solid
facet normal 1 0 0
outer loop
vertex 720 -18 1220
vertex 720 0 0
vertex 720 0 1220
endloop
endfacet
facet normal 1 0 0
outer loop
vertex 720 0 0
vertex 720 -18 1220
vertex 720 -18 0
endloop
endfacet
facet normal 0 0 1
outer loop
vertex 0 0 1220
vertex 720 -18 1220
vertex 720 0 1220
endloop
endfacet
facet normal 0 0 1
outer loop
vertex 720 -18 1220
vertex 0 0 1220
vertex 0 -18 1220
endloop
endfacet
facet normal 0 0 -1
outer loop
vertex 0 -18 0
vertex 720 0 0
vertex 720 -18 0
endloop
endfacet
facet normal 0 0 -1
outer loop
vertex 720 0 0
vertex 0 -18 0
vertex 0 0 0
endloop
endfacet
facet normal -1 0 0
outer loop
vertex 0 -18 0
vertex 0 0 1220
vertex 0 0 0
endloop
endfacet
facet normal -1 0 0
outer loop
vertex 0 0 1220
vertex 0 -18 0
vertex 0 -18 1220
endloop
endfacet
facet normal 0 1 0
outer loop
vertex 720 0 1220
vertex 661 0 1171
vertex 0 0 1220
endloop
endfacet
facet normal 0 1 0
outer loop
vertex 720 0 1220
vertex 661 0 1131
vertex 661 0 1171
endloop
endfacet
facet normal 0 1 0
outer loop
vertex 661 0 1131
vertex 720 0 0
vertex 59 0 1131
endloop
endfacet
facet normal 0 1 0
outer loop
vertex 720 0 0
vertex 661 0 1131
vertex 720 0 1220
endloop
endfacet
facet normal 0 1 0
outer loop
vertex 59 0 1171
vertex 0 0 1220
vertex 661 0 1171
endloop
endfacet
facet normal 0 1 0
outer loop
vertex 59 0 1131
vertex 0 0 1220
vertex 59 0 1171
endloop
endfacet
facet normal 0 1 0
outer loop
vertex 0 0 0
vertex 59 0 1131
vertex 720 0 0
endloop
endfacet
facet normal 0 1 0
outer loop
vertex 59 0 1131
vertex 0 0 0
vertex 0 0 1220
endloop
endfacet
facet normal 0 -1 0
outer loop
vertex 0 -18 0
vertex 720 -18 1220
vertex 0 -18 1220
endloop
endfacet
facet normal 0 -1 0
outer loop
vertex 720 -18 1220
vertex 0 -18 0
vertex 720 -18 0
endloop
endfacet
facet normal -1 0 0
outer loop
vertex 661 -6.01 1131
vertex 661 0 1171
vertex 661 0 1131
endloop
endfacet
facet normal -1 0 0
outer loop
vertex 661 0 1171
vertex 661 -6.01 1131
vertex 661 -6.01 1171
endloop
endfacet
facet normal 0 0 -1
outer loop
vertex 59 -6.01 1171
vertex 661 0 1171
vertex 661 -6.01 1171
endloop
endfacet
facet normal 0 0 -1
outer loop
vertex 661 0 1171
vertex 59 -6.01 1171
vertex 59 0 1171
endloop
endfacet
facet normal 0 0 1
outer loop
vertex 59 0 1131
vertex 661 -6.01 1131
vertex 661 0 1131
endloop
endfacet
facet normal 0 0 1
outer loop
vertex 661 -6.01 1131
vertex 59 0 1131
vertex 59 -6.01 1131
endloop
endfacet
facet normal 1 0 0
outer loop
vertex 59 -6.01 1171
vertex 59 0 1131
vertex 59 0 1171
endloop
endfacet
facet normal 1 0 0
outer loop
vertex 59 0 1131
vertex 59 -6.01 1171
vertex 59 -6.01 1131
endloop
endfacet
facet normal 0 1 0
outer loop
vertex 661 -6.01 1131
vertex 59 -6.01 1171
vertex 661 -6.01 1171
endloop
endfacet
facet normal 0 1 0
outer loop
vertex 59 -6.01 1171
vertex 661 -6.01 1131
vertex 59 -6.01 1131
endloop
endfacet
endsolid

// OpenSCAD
// file: ../components/backing_panel.scad
//
// Generic backing panel with optional routed recesses in the back face.
//
// Local coordinate system:
// - X: left to right
// - Y: back face at Y = 0, front projects towards negative Y
// - Z: bottom to top
//
// recesses: [x, z, width, height, depth]
//

module backing_panel(
    width,
    height,
    thickness,
    recesses = []
) {
    difference() {
        translate([0, -thickness, 0])
            cube([width, thickness, height]);

        for (r = recesses) {
            recess_x      = r[0];
            recess_z      = r[1];
            recess_width  = r[2];
            recess_height = r[3];
            recess_depth  = r[4];

            // Pocket is routed from the back face into the panel.
            translate([
                recess_x,
                -recess_depth - 0.01,
                recess_z
            ])
                cube([
                    recess_width,
                    recess_depth + 0.02,
                    recess_height
                ]);
        }
    }
}
// file: ../config.scad
//
// Garage layout - configuration
// Units: millimetres
//

$fn = 48;


/* [View] */

show_rear_wall           = true;
show_left_wall           = true;
show_window_frame        = true;
show_door_frame          = true;
show_window_sill         = true;
show_workbench           = true;
show_floor               = true;
show_tool_backing_panels = true;
show_skadis_panels       = true;
show_tool_panel_mounts   = true;
show_skadis_slot_pattern = true;
show_skadis_mount_points = true;
show_skadis_mount_hardware = false;

// Move multiplex + SKADIS towards the garage to inspect the concealed mount.
tool_panel_explode = 0; // [0:5:150]


/* [Garage walls] */

wall_width     = 3800;
wall_height    = 2600;

// Concrete / structural inner shell only.
// Additional exterior wall layers can be added later.
wall_thickness = 90;

// Temporary left-wall depth follows the currently modelled floor depth.
// This will become the measured garage depth later.
left_wall_depth = 2000;


/* [Window opening] */

// Inside view: measured from the left side of the rear wall.
window_left_offset = 480;
window_width       = 780;
window_height      = 1340;
window_top_offset  = 200;

window_bottom = wall_height - window_top_offset - window_height;


/* [Window sill] */

// Projection into the garage from the inside face of the wall.
window_sill_thickness  = 20;
window_sill_depth      = 20;
window_sill_side_extra = 20;


/* [Door opening] */

// Horizontal distance between the right side of the window opening
// and the left side of the door opening.
window_to_door = 740;

// Width is provisional until measured.
door_width  = 900;
door_height = 2300;

door_left = window_left_offset + window_width + window_to_door;


/* [Exterior frames] */

// Simplified visualization. Both frames sit on the exterior side
// of the 90 mm concrete wall.
frame_border = 50;
frame_depth  = 60;


/* [Workbench] */

workbench_width  = 1500;
workbench_depth  = 750;
workbench_height = 990;

workbench_top_thickness = 40;
workbench_leg_size      = 70;
workbench_leg_inset     = 60;

// Inside view: workbench starts at the left end of the rear wall.
workbench_x = 0;


/* [Tool panel backing] */

// Use the 1220 mm sheet dimension directly. The backing panels are centred
// vertically on the window opening instead of being made as tall as the window.
tool_panel_height = 1220;
tool_panel_bottom = window_bottom + (window_height - tool_panel_height) / 2;
tool_panel_top    = tool_panel_bottom + tool_panel_height;

tool_panel_thickness = 18;

// Left wall strip is 480 mm; keep 10 mm free on each side.
left_tool_panel_width = 460;
left_tool_panel_x = (window_left_offset - left_tool_panel_width) / 2;

// Right wall strip between window and door is 740 mm; keep 10 mm each side.
right_tool_panel_width = 720;
right_tool_panel_x =
    window_left_offset + window_width
    + (window_to_door - right_tool_panel_width) / 2;


/* [SKADIS] */

skadis_width  = 360;
skadis_height = 560;
skadis_thickness = 5;

// Approximate stand-off created by the original IKEA wall rail/spacers.
skadis_mount_gap = 15;

// Geometry used for the recognisable SKADIS pattern.
skadis_corner_radius = 9;
skadis_slot_width    = 5;
skadis_slot_height   = 15;
skadis_grid_pitch    = 40;
skadis_grid_offset   = 20;

// The 36 cm board uses the supplied 20 cm wall rail. The four visible board
// fasteners are modelled at the corresponding left/right positions.
skadis_rail_length = 200;
skadis_mount_point_z_inset = 20;
skadis_mount_head_diameter = 12;
skadis_mount_head_depth = 2;


/* [Tool panel mounting - Ropro] */

// Ropro Heavy Duty French Cleat / Z-bar known dimensions.
cleat_profile_height = 38;
cleat_wall_distance  = 6;

// Route the full wall-rail envelope into the back of the 18 mm multiplex.
// This leaves 12 mm of multiplex below the recess and must be considered
// when selecting screws for the panel-side counter profile.
cleat_recess_depth = 6;
cleat_recess_clearance = 1;

// Position rail near the upper edge, safely above the panel centre of gravity.
cleat_top_inset = 50;

// Left panel: Ropro Heavy Duty 30 cm set (300 + 300 mm).
left_cleat_wall_length  = 300;
left_cleat_panel_length = 300;

// Right panel: Ropro Heavy Duty 60+6 cm set:
// 600 mm wall rail + two 60 mm panel-side counter profiles.
right_cleat_wall_length = 600;
right_cleat_panel_piece_length = 60;


/* [Floor] */

// Temporary depth until the complete garage depth is measured.
floor_depth     = 2000;
floor_thickness = 100;
// main file
// Export entry point: right 720 x 1360 x 18 mm multiplex backing panel.

include <../config.scad>
include <../components/backing_panel.scad>

recess_width = right_cleat_wall_length + 2 * cleat_recess_clearance;
recess_height = cleat_profile_height + 2 * cleat_recess_clearance;
recess_x = (right_tool_panel_width - recess_width) / 2;
cleat_z = tool_panel_height - cleat_top_inset - cleat_profile_height;
recess_z = cleat_z - cleat_recess_clearance;

backing_panel(
    width = right_tool_panel_width,
    height = tool_panel_height,
    thickness = tool_panel_thickness,
    recesses = [[
        recess_x,
        recess_z,
        recess_width,
        recess_height,
        cleat_recess_depth
    ]]
);
